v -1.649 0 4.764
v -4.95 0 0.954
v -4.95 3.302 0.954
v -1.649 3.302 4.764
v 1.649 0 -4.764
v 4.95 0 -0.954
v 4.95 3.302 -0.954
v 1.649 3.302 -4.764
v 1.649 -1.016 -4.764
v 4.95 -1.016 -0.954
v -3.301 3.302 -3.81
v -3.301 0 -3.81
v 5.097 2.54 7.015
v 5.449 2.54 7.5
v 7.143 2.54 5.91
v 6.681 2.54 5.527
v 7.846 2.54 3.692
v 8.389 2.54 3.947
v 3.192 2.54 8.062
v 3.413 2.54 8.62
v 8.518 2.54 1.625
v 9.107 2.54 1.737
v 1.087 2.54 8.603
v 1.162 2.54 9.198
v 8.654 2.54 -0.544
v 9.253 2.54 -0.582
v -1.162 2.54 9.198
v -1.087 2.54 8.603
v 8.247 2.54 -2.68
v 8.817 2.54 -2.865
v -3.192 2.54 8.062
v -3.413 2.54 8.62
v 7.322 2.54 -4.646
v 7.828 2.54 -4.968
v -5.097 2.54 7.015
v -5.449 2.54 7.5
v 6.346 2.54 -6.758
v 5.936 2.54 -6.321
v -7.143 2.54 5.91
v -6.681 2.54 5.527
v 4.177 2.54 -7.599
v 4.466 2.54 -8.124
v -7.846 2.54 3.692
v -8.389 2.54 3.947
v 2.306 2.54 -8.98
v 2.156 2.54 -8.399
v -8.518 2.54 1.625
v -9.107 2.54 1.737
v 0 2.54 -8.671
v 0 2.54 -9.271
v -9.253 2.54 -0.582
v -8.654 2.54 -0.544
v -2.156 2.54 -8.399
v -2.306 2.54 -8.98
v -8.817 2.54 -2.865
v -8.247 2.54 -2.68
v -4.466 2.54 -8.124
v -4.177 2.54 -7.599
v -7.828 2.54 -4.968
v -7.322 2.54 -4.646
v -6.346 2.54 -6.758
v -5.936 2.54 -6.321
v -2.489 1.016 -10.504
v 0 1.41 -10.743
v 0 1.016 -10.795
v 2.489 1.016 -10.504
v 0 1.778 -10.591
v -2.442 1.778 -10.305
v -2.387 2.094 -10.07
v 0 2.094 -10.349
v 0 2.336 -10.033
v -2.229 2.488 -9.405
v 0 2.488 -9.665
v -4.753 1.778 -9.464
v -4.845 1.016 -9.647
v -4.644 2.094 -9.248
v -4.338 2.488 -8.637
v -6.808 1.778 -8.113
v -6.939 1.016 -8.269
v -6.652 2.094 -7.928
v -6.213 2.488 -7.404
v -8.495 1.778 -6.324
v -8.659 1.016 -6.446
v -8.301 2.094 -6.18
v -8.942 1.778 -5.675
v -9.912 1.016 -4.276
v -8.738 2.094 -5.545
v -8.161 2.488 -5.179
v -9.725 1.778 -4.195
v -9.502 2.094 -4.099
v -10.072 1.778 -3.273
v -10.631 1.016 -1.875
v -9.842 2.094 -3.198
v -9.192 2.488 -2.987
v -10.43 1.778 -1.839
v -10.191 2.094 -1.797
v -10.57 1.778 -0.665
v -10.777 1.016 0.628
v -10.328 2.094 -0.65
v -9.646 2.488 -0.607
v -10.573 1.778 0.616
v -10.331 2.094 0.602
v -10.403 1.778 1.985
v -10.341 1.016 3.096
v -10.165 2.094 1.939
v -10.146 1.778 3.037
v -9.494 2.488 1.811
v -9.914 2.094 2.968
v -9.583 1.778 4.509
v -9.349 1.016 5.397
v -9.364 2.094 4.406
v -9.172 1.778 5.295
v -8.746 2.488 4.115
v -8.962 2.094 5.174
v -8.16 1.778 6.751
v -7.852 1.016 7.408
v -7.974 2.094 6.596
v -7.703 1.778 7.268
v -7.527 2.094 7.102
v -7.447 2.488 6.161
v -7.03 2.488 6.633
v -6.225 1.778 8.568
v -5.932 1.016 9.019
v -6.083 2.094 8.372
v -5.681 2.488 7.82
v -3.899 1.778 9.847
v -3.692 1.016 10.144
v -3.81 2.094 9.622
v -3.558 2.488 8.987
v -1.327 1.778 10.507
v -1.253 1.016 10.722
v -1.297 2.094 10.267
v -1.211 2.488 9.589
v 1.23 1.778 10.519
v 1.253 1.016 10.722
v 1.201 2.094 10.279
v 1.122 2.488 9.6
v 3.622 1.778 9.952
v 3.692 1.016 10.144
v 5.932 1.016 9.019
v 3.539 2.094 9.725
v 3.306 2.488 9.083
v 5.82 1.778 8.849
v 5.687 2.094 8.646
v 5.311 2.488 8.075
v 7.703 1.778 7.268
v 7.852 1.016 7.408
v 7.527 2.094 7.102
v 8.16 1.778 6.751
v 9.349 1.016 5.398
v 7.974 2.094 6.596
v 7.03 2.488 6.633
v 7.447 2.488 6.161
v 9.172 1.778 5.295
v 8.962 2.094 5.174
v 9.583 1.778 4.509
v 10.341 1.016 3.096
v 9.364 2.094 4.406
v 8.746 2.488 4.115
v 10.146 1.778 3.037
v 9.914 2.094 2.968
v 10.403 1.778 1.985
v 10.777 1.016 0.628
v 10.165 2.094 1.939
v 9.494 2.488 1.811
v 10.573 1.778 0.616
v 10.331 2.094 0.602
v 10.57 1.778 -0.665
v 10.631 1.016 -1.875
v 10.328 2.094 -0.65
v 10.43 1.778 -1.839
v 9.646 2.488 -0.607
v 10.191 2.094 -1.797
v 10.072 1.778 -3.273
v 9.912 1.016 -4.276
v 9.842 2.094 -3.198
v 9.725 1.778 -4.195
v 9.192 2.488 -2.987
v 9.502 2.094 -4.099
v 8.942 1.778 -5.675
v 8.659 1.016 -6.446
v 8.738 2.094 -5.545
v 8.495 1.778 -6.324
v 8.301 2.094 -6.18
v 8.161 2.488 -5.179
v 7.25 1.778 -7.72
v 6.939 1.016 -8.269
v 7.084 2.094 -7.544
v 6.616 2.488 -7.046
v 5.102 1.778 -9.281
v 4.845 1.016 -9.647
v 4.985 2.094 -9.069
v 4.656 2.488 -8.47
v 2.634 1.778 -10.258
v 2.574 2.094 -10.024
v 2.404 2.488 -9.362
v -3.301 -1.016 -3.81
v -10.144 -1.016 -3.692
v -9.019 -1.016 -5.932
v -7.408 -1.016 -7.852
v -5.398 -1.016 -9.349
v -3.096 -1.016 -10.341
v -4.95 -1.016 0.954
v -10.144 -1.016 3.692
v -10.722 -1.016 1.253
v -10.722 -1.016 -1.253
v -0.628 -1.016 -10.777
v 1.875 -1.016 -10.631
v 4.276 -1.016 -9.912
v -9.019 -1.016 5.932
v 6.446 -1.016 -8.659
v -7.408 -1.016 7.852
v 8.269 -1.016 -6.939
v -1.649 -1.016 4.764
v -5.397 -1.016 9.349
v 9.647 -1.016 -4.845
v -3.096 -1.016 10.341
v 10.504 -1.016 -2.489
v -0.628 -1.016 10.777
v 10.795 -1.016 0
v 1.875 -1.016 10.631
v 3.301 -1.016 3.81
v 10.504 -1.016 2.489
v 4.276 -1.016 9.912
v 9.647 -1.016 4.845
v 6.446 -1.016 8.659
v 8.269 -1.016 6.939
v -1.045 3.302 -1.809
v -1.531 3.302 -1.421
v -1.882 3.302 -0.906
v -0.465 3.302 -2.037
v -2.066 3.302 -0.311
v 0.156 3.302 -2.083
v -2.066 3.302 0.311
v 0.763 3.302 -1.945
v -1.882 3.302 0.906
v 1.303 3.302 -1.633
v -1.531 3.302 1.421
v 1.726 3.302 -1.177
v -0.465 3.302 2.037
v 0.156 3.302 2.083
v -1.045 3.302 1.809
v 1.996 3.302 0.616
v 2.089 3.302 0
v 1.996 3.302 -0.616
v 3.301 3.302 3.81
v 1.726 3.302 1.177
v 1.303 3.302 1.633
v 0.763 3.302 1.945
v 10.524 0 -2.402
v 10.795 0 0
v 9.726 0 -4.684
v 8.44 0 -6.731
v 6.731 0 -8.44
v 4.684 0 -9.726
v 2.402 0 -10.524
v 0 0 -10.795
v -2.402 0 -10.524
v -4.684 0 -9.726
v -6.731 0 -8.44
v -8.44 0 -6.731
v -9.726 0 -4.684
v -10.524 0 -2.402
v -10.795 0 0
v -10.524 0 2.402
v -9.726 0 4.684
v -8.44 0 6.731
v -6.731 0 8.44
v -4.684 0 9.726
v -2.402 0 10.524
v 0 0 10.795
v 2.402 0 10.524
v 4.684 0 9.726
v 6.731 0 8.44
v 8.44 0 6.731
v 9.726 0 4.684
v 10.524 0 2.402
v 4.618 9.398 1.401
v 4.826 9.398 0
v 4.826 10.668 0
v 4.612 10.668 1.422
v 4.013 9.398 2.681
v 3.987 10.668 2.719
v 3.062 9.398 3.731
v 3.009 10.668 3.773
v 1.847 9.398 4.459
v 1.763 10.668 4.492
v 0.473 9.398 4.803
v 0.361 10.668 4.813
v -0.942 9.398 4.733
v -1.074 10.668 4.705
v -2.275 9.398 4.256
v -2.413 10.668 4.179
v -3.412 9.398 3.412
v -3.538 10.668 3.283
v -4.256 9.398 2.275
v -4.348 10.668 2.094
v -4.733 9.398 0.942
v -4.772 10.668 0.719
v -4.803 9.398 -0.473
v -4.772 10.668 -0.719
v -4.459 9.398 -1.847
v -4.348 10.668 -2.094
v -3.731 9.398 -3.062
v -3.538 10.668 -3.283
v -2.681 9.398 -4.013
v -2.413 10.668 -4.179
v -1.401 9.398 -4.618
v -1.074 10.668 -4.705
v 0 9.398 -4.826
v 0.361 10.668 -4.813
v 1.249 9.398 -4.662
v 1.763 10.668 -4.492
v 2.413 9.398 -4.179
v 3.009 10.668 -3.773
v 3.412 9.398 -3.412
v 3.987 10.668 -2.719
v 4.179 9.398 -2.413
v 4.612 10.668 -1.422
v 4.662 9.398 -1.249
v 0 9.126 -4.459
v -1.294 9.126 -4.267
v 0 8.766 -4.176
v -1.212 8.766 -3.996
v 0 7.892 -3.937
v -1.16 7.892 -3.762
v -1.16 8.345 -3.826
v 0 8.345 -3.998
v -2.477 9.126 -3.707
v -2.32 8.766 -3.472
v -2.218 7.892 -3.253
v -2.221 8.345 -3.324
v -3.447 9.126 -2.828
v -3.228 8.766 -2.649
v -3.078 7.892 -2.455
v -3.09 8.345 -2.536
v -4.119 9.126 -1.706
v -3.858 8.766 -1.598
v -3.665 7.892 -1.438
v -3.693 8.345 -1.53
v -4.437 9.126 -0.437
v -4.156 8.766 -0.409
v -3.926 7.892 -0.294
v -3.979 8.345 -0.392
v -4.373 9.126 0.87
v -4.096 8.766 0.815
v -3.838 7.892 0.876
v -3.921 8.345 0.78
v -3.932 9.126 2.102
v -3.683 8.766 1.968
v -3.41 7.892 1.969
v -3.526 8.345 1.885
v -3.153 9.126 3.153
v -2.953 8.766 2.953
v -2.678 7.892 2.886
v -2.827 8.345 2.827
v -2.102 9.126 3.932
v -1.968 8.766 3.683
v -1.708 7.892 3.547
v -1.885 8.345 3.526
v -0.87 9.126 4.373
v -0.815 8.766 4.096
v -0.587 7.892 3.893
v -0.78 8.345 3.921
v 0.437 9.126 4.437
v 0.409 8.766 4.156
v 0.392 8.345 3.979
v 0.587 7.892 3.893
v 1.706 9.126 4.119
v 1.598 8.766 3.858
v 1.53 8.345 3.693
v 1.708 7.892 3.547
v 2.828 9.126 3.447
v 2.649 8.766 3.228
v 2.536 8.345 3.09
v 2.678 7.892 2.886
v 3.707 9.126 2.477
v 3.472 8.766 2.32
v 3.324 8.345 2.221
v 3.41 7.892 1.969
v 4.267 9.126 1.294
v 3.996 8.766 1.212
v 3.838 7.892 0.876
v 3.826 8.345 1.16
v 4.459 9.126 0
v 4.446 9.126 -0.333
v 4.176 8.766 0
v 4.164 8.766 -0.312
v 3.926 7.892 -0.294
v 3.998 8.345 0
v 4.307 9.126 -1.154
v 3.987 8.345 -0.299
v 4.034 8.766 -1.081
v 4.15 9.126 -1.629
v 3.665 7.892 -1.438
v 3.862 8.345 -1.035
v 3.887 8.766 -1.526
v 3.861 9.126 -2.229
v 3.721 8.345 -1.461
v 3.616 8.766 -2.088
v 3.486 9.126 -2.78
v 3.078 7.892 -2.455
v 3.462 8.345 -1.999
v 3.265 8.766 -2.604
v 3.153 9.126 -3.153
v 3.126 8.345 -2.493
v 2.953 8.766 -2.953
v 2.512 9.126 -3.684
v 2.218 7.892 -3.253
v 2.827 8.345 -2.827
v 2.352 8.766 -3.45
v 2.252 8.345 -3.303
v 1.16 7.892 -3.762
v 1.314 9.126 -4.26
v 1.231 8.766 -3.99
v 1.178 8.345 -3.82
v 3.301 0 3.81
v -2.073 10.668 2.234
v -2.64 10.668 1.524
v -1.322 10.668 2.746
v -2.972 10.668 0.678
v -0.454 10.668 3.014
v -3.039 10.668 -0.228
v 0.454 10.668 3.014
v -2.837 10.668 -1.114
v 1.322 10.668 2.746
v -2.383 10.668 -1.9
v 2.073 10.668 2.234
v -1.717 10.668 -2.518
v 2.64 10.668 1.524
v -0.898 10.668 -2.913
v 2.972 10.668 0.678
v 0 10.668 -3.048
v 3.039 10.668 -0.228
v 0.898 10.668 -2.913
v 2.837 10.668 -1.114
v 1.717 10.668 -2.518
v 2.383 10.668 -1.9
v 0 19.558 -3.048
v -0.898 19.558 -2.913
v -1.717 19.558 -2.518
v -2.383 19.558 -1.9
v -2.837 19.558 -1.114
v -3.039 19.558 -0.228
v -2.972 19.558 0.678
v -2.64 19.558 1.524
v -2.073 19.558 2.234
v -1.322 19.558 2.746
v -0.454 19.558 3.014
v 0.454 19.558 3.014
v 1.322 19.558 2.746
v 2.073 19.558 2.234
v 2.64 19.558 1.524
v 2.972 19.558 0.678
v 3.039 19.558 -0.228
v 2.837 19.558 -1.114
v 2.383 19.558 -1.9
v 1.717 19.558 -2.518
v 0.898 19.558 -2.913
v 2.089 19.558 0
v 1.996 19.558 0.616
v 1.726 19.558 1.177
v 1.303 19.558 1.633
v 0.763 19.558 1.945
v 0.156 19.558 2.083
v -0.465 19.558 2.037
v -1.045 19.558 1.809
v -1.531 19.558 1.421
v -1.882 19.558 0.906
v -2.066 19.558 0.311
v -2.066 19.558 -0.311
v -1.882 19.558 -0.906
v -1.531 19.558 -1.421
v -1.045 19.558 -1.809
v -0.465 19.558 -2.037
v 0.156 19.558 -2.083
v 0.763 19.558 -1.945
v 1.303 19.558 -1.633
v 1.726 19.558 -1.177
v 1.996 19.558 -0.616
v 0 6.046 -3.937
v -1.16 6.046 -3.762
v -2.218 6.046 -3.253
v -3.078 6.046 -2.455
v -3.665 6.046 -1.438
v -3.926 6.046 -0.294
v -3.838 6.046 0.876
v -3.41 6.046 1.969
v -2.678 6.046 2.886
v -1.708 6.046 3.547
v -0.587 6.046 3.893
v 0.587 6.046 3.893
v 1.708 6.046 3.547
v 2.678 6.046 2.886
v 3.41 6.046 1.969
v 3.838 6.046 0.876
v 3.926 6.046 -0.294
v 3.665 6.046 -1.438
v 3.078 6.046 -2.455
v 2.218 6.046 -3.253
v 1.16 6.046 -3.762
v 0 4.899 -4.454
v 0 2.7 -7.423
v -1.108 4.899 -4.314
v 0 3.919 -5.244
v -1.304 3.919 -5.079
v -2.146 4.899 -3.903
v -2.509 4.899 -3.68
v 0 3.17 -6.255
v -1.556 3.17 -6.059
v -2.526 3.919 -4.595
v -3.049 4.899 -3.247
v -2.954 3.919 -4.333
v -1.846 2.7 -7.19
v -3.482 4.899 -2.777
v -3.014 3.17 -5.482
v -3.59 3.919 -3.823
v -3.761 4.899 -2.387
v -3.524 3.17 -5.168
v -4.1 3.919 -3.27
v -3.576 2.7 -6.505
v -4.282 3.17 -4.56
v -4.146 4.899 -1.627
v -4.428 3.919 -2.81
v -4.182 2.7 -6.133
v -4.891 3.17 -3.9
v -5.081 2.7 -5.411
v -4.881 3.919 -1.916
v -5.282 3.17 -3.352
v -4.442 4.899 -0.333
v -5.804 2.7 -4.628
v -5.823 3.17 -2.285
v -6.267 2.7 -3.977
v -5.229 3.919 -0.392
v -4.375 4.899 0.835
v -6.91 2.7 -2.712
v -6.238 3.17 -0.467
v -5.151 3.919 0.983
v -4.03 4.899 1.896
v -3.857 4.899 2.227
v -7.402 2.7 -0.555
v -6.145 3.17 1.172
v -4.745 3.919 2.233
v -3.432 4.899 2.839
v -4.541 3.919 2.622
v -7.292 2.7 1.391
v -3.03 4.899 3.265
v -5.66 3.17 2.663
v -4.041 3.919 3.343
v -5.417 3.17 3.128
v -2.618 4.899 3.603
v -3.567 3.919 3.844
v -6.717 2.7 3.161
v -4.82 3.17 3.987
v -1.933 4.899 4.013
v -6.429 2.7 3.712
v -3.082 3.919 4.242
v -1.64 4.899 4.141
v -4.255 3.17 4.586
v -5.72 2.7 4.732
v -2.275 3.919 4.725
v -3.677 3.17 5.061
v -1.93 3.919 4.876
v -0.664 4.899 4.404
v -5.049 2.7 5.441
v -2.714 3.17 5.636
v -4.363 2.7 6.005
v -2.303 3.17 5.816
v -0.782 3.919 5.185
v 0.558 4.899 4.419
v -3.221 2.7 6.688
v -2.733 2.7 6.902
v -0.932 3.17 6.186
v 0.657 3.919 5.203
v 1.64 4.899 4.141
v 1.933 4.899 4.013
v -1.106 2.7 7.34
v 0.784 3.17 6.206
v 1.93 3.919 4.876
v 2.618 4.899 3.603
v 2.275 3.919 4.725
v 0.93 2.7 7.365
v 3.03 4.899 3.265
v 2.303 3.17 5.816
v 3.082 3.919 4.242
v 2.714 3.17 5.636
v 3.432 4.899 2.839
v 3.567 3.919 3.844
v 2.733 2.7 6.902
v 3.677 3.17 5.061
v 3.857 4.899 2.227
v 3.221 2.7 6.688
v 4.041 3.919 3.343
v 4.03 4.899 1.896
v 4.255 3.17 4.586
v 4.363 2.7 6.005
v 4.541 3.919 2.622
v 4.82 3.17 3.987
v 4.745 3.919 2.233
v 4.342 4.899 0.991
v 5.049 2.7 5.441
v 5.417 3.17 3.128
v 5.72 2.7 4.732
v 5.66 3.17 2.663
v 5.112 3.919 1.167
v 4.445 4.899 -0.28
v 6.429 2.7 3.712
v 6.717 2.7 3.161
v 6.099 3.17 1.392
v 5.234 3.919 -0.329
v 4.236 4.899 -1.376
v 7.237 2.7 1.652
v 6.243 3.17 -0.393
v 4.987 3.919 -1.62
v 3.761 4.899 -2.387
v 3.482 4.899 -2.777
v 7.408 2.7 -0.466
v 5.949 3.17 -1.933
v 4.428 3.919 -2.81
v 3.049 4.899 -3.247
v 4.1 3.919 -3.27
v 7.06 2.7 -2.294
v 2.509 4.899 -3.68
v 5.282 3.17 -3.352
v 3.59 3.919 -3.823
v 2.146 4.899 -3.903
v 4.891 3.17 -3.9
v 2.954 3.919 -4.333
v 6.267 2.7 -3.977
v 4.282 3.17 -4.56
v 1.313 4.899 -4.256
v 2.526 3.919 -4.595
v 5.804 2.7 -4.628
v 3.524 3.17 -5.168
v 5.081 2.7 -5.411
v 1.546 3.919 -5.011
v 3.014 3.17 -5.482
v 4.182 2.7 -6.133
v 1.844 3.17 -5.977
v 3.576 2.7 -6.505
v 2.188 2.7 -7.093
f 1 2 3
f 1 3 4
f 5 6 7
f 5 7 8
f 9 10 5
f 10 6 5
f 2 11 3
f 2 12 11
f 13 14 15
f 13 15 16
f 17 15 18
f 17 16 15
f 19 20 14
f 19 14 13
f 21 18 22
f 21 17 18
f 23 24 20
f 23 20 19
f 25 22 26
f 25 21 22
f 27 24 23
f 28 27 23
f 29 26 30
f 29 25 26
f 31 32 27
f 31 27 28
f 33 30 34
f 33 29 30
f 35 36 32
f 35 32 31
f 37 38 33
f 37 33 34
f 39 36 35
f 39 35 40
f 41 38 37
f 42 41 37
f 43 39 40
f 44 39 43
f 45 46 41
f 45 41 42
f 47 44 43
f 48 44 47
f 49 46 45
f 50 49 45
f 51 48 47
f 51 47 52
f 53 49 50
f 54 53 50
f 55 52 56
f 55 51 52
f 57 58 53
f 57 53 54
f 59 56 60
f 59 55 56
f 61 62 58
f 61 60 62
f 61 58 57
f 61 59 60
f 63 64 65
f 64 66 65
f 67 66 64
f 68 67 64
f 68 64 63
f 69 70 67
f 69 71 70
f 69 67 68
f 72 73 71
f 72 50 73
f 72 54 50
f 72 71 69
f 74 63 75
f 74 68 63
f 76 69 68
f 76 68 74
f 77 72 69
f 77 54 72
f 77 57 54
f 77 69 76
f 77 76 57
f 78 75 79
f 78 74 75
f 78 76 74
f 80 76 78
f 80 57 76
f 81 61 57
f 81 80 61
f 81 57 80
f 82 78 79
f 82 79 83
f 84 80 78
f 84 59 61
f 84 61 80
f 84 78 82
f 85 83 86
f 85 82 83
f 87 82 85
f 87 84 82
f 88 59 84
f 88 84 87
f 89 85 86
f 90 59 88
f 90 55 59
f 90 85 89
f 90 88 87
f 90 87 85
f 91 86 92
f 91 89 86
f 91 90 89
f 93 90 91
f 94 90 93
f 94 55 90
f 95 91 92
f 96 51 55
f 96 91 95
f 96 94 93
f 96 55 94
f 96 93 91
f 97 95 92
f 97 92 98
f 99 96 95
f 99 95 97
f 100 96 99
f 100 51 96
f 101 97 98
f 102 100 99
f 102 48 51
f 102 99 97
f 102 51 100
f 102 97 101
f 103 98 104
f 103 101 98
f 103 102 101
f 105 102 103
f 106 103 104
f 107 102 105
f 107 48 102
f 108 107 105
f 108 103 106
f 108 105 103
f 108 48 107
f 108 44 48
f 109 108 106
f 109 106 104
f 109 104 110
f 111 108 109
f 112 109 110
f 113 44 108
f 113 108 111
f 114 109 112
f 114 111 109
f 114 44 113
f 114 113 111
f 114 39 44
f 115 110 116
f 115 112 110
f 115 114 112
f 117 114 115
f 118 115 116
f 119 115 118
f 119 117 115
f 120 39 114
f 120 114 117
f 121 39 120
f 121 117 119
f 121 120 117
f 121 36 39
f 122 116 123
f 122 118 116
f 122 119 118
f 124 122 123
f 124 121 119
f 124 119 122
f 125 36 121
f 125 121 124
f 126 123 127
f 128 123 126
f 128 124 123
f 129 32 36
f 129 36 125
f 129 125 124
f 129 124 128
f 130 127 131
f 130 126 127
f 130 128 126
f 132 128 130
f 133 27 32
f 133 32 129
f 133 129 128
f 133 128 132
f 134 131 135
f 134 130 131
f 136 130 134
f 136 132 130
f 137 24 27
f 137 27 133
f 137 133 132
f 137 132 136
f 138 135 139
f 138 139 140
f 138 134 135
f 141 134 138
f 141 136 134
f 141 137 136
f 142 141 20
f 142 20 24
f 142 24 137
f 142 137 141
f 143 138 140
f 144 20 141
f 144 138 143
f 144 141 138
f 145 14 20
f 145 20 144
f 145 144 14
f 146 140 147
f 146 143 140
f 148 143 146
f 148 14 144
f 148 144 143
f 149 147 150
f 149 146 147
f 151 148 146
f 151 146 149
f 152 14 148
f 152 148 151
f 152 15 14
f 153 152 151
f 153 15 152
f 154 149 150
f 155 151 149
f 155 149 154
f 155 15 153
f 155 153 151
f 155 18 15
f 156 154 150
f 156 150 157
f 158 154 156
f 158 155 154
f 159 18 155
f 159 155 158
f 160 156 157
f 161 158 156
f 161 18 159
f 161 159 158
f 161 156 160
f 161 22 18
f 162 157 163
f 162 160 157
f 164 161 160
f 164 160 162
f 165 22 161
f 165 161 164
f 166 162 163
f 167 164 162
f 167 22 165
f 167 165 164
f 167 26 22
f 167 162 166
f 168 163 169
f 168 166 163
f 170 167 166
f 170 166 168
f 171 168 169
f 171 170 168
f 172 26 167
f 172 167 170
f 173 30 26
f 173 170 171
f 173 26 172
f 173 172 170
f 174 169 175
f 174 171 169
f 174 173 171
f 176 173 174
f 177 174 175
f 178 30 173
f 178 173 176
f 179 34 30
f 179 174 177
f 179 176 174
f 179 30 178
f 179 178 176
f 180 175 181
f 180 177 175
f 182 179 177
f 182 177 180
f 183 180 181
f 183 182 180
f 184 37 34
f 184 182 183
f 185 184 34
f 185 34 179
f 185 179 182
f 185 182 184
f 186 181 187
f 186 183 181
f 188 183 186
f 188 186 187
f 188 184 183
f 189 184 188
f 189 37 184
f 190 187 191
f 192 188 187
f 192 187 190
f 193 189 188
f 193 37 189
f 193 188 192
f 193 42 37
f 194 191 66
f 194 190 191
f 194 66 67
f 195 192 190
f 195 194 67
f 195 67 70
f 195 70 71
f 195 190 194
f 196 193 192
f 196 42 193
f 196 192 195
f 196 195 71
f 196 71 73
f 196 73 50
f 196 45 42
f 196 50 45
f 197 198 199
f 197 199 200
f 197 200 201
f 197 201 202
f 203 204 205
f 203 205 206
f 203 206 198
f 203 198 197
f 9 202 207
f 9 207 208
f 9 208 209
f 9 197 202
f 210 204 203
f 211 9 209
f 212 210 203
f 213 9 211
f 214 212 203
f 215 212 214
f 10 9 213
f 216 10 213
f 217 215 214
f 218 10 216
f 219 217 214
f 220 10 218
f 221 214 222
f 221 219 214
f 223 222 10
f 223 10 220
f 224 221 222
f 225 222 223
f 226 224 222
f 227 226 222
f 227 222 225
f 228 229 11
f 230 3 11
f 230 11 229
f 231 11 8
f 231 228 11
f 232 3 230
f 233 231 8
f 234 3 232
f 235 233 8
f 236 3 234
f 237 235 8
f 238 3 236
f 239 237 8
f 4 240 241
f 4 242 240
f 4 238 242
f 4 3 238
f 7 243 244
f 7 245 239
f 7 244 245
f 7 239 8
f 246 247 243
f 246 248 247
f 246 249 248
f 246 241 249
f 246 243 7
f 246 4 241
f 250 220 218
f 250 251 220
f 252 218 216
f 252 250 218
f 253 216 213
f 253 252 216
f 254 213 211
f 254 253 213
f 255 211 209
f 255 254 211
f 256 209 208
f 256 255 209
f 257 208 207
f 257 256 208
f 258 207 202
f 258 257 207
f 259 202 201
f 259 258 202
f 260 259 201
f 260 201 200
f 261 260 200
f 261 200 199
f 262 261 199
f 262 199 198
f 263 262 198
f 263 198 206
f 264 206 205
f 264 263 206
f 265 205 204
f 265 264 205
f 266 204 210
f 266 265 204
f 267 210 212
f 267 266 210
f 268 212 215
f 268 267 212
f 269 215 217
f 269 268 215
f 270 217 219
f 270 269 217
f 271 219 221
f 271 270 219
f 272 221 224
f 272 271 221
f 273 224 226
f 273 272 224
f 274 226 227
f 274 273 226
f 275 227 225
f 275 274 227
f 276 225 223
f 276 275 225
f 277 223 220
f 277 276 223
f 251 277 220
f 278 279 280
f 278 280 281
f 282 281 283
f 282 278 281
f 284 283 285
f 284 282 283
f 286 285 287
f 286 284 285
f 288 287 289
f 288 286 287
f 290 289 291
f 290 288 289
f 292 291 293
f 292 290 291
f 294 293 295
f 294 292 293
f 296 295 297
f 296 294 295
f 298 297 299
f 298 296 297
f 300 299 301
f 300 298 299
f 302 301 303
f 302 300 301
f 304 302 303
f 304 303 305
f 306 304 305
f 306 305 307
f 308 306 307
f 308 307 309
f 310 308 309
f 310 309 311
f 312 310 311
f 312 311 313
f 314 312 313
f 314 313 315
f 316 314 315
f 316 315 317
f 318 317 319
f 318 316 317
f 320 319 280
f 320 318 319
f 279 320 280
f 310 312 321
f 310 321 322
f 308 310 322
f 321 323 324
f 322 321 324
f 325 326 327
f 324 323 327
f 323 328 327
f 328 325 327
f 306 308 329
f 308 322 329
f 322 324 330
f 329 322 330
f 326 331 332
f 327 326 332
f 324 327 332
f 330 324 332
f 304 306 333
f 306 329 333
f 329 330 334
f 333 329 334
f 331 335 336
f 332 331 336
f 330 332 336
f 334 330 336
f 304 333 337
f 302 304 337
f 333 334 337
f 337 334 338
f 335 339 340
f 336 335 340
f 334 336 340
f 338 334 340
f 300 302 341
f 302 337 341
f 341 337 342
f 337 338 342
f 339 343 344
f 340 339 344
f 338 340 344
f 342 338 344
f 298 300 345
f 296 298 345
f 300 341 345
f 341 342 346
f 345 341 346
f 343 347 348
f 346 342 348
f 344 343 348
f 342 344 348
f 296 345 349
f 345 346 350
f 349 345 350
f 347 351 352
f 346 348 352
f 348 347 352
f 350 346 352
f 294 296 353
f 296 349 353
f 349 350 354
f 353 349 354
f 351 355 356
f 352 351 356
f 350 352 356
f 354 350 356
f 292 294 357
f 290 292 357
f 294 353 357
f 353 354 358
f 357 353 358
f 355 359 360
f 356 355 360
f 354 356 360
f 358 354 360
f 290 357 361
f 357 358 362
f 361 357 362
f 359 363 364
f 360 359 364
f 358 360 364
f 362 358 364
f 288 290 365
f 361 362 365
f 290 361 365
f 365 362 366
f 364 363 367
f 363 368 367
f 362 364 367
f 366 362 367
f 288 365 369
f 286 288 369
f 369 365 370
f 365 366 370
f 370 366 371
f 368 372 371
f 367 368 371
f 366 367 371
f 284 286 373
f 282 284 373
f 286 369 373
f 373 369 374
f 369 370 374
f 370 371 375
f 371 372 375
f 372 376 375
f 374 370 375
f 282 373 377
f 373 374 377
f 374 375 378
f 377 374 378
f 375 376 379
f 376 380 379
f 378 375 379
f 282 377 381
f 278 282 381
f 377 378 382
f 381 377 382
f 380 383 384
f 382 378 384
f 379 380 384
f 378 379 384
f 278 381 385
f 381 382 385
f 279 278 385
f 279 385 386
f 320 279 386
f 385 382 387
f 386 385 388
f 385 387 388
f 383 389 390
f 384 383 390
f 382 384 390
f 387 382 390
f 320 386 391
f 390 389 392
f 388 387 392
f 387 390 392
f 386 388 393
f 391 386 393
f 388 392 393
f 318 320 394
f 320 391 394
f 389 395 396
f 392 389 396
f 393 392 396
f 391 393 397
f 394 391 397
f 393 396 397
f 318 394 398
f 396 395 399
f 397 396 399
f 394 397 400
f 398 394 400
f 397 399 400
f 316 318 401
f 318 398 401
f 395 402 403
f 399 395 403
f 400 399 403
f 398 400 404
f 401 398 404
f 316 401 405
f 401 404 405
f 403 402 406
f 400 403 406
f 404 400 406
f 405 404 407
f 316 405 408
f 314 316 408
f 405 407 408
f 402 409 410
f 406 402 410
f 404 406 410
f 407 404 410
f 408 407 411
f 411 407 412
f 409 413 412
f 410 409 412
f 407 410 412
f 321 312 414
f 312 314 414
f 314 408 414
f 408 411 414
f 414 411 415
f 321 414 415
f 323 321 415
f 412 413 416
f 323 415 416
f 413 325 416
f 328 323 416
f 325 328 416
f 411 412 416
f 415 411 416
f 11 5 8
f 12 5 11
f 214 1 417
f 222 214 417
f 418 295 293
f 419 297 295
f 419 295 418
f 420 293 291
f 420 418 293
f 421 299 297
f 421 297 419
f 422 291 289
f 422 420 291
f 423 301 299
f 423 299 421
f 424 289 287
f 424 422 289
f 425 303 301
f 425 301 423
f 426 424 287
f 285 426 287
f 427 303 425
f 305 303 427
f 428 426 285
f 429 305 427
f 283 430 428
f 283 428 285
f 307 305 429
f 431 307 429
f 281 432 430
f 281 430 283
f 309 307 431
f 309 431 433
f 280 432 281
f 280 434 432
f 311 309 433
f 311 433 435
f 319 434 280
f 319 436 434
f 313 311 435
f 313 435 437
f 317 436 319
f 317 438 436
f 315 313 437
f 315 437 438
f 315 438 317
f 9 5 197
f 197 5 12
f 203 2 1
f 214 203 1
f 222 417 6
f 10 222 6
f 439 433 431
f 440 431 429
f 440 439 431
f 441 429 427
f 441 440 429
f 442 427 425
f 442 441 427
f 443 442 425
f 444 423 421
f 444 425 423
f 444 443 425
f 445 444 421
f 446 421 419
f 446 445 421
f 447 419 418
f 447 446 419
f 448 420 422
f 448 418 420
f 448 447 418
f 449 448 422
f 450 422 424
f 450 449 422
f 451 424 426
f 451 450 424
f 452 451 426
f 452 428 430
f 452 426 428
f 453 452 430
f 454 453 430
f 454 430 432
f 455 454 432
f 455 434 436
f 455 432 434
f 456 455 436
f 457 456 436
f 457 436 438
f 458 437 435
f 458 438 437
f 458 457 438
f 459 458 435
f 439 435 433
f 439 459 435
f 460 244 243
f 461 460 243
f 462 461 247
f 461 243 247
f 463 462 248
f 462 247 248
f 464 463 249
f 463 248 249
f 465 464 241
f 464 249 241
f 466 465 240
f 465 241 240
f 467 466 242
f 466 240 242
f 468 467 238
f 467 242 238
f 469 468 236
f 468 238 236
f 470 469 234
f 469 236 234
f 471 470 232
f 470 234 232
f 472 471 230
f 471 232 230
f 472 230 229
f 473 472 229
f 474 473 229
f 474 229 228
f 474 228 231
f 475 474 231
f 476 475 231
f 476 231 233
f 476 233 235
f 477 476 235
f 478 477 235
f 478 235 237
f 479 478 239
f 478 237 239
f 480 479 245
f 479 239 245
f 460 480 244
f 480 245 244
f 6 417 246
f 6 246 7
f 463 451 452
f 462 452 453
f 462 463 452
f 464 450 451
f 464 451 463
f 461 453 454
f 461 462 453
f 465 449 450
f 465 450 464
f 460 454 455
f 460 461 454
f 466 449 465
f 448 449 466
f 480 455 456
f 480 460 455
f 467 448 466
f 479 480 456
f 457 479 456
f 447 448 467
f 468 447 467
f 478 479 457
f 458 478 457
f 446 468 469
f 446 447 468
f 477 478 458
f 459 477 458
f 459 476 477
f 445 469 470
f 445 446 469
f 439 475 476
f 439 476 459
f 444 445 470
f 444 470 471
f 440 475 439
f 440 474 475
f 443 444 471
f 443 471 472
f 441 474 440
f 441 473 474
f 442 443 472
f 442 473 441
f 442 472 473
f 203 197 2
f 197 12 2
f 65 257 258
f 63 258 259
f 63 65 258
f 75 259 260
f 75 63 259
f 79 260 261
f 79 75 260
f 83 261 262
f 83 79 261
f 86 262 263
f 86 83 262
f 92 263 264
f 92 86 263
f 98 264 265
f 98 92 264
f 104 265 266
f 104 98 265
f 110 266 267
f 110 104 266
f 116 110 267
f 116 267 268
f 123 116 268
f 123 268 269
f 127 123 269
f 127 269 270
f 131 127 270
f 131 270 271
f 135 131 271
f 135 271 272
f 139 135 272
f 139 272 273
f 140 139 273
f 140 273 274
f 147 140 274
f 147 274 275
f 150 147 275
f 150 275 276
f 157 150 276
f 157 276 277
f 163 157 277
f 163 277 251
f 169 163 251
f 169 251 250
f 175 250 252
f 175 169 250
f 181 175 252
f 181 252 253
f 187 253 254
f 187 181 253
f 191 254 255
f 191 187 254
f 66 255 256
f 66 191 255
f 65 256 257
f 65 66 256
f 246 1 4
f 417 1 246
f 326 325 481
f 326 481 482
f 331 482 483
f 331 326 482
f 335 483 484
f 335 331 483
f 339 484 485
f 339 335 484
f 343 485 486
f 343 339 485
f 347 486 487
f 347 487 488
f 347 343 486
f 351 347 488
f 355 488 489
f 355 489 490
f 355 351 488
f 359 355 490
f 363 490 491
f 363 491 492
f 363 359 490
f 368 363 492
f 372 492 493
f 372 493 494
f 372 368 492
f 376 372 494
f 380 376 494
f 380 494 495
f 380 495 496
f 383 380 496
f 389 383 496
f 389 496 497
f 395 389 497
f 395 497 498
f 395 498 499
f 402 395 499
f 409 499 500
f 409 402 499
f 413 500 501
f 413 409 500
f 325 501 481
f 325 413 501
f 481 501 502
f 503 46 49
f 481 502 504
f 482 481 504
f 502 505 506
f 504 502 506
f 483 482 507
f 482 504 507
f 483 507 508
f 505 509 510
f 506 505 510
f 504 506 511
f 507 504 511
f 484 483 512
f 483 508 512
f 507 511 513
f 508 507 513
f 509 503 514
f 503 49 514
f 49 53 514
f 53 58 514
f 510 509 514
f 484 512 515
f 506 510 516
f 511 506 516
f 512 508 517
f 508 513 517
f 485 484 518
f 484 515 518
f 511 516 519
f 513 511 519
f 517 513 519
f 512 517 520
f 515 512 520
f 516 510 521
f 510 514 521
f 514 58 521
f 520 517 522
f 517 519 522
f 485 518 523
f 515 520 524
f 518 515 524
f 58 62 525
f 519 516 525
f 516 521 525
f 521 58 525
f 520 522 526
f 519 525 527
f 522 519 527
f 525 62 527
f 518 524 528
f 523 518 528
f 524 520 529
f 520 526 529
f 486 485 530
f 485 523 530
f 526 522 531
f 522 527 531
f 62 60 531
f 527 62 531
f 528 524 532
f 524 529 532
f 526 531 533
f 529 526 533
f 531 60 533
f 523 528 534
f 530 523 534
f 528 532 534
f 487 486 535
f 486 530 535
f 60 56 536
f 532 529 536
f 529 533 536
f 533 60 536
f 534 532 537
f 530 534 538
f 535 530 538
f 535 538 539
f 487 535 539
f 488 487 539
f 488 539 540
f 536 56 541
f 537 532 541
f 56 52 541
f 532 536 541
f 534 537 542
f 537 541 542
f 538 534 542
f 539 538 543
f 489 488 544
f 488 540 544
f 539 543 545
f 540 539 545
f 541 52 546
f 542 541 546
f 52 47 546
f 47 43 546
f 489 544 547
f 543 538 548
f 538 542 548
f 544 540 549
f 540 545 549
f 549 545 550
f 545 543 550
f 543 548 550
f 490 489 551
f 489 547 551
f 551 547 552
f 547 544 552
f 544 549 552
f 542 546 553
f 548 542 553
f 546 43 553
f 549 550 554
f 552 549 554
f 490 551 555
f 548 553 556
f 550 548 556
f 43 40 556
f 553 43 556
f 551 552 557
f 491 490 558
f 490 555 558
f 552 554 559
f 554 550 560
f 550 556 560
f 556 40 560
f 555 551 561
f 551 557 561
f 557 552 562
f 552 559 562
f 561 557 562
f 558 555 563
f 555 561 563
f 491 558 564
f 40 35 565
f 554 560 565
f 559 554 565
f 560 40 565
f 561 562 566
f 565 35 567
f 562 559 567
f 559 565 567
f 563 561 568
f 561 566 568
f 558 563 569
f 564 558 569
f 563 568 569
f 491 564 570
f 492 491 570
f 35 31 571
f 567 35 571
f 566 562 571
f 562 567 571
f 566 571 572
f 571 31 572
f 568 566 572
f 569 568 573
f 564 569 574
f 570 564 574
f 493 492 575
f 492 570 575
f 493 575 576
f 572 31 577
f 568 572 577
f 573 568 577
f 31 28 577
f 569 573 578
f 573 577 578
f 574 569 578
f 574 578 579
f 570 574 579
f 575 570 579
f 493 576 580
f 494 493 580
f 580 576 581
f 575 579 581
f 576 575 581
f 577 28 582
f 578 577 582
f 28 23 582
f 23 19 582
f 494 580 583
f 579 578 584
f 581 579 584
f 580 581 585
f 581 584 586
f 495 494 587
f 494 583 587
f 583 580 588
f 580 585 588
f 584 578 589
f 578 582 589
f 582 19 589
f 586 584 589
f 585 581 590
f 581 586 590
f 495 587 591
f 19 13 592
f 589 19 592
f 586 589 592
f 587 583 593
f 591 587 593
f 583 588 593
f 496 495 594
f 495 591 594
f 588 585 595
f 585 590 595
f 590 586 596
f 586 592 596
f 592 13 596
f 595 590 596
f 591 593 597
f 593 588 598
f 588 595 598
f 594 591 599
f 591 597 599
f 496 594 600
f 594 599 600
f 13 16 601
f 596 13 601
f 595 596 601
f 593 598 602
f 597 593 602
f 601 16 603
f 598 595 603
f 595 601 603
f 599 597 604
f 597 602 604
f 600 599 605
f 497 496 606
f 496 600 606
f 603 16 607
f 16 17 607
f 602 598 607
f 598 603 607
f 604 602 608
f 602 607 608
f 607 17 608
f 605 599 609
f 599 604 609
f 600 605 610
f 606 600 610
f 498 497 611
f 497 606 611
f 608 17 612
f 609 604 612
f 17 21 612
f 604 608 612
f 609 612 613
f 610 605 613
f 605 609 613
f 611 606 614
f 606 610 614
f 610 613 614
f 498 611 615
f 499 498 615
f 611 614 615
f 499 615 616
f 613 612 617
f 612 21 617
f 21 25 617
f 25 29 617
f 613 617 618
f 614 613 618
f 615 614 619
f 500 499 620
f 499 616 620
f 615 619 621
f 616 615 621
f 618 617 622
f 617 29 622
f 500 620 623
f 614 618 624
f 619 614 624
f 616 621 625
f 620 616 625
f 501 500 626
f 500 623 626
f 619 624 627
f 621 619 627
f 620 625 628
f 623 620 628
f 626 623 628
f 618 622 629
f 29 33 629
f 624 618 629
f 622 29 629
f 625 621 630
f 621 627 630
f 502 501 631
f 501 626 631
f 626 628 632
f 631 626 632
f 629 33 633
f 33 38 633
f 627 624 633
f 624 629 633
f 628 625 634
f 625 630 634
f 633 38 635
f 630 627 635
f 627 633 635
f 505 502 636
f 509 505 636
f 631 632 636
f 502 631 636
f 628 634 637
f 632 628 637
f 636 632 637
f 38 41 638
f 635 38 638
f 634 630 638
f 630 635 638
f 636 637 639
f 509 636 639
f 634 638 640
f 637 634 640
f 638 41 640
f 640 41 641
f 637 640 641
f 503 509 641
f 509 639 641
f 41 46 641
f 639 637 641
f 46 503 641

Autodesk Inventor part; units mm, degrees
ref_plane "YZ Plane" through (0, 0, 0) normal (1, 0, 0) x (0, 1, 0)
ref_plane "XZ Plane" through (0, 0, 0) normal (0, 1, 0) x (-1, 0, 0)
ref_plane "XY Plane" through (0, 0, 0) normal (0, 0, 1) x (1, 0, 0)
sketch "Sketch1" plane through (0, 0, 0) normal (1, 0, 0) x (0, 1, 0)
  line L0 (0, 0) -> (0, -10.795)
  line L1 (0, -10.795) -> (2.54, -10.795)
  line L2 (0, 0) -> (12.7, 0)
  line L3 (2.54, -10.795) -> (2.54, -9.9414)
  line L4 (2.54, -9.9414) -> (2.54, -8.6714)
  line L5 (14.986, -3.937) -> (1.8235, -3.937) construction
  arc A0 (6.0461, -3.937) -> (2.54, -8.6714) centre (7.4896, -8.6714) ccw
  line L6 (9.398, -3.048) -> (9.398, -4.826)
  line L7 (6.0461, -3.937) -> (7.8921, -3.937)
  arc A1 (9.398, -4.826) -> (7.8921, -3.937) centre (7.8921, -5.6569) ccw
  line L8 (19.558, 0) -> (0, 0)
  line L9 (9.398, -3.048) -> (19.558, -3.048)
  line L10 (19.558, -3.048) -> (19.558, 0)
  dimension "d0" = 10.795
  dimension "d1" = 2.54
  dimension "d2" = 12.7
  dimension "d5" = 3.937
  dimension "d6" = 1.27
  dimension "d7" = 4.9496
  dimension "d18" = 4.826
  dimension "d19" = 1.7199
  dimension "d24" = 9.398
  dimension "d25" = 10.16
  dimension "d26" = 3.048
  dimension "d27" = 4.572
  dimension "d28" = 5.6234
  dimension "d29" = 17.7345
revolve "Revolution1" add sketch "Sketch1" angle 360 about axis through (0, 0, 0) along (0, 1, 0)
sketch "Sketch2" plane through (0, 0, 0) normal (0, -1, 0) x (1, 0, 0)
  circle A0 centre (0, 0) radius 3.048 projected
  line L0 (4.95, -0.9536) -> (1.6491, -4.7636)
  line L1 (1.6491, -4.7636) -> (-3.3008, -3.81)
  line L2 (-3.3008, -3.81) -> (-4.95, 0.9536)
  line L3 (-4.95, 0.9536) -> (-1.6491, 4.7636)
  line L4 (-1.6491, 4.7636) -> (3.3008, 3.81)
  line L5 (3.3008, 3.81) -> (4.95, -0.9536)
  dimension "d11" = 8.7312
  dimension "d12" = 7.62
extrude "Extrusion1" cut sketch "Sketch2" against normal blind 3.302 contours A0 | L0 L1 L2 L3 L4 L5
sketch "Sketch3" plane through (0, 3.302, 0) normal (0, -1, 0) x (1, 0, 0)
  circle A0 centre (0, 0) radius 2.0892
  dimension "d15" = 4.1783
extrude "Extrusion2" cut sketch "Sketch3" against normal up to surface (16.256 mm away)
sketch "Sketch5" plane through (0, 9.398, 0) normal (0, 1, 0) x (1, 0, 0)
  circle A0 centre (0, 0) radius 4.826 projected
  circle A1 centre (0, 0) radius 3.048 projected
extrude "Extrusion5" add sketch "Sketch5" along normal blind 1.27
sketch "Sketch6" plane through (0, 0, 0) normal (0, -1, 0) x (1, 0, 0)
  circle A0 centre (0, 0) radius 10.795 projected
  line L0 (3.3008, 3.81) -> (4.95, -0.9536) projected
  line L1 (4.95, -0.9536) -> (1.6491, -4.7636) projected
  line L2 (1.6491, -4.7636) -> (-3.3008, -3.81) projected
  line L3 (-3.3008, -3.81) -> (-4.95, 0.9536) projected
  line L4 (-4.95, 0.9536) -> (-1.6491, 4.7636) projected
  line L5 (-1.6491, 4.7636) -> (3.3008, 3.81) projected
extrude "Extrusion6" add sketch "Sketch6" along normal blind 1.016
fillet "Fillet1" radius 1.524 1 edges at (0, 2.54, 10.795)
properties part number "_3DPrint"
